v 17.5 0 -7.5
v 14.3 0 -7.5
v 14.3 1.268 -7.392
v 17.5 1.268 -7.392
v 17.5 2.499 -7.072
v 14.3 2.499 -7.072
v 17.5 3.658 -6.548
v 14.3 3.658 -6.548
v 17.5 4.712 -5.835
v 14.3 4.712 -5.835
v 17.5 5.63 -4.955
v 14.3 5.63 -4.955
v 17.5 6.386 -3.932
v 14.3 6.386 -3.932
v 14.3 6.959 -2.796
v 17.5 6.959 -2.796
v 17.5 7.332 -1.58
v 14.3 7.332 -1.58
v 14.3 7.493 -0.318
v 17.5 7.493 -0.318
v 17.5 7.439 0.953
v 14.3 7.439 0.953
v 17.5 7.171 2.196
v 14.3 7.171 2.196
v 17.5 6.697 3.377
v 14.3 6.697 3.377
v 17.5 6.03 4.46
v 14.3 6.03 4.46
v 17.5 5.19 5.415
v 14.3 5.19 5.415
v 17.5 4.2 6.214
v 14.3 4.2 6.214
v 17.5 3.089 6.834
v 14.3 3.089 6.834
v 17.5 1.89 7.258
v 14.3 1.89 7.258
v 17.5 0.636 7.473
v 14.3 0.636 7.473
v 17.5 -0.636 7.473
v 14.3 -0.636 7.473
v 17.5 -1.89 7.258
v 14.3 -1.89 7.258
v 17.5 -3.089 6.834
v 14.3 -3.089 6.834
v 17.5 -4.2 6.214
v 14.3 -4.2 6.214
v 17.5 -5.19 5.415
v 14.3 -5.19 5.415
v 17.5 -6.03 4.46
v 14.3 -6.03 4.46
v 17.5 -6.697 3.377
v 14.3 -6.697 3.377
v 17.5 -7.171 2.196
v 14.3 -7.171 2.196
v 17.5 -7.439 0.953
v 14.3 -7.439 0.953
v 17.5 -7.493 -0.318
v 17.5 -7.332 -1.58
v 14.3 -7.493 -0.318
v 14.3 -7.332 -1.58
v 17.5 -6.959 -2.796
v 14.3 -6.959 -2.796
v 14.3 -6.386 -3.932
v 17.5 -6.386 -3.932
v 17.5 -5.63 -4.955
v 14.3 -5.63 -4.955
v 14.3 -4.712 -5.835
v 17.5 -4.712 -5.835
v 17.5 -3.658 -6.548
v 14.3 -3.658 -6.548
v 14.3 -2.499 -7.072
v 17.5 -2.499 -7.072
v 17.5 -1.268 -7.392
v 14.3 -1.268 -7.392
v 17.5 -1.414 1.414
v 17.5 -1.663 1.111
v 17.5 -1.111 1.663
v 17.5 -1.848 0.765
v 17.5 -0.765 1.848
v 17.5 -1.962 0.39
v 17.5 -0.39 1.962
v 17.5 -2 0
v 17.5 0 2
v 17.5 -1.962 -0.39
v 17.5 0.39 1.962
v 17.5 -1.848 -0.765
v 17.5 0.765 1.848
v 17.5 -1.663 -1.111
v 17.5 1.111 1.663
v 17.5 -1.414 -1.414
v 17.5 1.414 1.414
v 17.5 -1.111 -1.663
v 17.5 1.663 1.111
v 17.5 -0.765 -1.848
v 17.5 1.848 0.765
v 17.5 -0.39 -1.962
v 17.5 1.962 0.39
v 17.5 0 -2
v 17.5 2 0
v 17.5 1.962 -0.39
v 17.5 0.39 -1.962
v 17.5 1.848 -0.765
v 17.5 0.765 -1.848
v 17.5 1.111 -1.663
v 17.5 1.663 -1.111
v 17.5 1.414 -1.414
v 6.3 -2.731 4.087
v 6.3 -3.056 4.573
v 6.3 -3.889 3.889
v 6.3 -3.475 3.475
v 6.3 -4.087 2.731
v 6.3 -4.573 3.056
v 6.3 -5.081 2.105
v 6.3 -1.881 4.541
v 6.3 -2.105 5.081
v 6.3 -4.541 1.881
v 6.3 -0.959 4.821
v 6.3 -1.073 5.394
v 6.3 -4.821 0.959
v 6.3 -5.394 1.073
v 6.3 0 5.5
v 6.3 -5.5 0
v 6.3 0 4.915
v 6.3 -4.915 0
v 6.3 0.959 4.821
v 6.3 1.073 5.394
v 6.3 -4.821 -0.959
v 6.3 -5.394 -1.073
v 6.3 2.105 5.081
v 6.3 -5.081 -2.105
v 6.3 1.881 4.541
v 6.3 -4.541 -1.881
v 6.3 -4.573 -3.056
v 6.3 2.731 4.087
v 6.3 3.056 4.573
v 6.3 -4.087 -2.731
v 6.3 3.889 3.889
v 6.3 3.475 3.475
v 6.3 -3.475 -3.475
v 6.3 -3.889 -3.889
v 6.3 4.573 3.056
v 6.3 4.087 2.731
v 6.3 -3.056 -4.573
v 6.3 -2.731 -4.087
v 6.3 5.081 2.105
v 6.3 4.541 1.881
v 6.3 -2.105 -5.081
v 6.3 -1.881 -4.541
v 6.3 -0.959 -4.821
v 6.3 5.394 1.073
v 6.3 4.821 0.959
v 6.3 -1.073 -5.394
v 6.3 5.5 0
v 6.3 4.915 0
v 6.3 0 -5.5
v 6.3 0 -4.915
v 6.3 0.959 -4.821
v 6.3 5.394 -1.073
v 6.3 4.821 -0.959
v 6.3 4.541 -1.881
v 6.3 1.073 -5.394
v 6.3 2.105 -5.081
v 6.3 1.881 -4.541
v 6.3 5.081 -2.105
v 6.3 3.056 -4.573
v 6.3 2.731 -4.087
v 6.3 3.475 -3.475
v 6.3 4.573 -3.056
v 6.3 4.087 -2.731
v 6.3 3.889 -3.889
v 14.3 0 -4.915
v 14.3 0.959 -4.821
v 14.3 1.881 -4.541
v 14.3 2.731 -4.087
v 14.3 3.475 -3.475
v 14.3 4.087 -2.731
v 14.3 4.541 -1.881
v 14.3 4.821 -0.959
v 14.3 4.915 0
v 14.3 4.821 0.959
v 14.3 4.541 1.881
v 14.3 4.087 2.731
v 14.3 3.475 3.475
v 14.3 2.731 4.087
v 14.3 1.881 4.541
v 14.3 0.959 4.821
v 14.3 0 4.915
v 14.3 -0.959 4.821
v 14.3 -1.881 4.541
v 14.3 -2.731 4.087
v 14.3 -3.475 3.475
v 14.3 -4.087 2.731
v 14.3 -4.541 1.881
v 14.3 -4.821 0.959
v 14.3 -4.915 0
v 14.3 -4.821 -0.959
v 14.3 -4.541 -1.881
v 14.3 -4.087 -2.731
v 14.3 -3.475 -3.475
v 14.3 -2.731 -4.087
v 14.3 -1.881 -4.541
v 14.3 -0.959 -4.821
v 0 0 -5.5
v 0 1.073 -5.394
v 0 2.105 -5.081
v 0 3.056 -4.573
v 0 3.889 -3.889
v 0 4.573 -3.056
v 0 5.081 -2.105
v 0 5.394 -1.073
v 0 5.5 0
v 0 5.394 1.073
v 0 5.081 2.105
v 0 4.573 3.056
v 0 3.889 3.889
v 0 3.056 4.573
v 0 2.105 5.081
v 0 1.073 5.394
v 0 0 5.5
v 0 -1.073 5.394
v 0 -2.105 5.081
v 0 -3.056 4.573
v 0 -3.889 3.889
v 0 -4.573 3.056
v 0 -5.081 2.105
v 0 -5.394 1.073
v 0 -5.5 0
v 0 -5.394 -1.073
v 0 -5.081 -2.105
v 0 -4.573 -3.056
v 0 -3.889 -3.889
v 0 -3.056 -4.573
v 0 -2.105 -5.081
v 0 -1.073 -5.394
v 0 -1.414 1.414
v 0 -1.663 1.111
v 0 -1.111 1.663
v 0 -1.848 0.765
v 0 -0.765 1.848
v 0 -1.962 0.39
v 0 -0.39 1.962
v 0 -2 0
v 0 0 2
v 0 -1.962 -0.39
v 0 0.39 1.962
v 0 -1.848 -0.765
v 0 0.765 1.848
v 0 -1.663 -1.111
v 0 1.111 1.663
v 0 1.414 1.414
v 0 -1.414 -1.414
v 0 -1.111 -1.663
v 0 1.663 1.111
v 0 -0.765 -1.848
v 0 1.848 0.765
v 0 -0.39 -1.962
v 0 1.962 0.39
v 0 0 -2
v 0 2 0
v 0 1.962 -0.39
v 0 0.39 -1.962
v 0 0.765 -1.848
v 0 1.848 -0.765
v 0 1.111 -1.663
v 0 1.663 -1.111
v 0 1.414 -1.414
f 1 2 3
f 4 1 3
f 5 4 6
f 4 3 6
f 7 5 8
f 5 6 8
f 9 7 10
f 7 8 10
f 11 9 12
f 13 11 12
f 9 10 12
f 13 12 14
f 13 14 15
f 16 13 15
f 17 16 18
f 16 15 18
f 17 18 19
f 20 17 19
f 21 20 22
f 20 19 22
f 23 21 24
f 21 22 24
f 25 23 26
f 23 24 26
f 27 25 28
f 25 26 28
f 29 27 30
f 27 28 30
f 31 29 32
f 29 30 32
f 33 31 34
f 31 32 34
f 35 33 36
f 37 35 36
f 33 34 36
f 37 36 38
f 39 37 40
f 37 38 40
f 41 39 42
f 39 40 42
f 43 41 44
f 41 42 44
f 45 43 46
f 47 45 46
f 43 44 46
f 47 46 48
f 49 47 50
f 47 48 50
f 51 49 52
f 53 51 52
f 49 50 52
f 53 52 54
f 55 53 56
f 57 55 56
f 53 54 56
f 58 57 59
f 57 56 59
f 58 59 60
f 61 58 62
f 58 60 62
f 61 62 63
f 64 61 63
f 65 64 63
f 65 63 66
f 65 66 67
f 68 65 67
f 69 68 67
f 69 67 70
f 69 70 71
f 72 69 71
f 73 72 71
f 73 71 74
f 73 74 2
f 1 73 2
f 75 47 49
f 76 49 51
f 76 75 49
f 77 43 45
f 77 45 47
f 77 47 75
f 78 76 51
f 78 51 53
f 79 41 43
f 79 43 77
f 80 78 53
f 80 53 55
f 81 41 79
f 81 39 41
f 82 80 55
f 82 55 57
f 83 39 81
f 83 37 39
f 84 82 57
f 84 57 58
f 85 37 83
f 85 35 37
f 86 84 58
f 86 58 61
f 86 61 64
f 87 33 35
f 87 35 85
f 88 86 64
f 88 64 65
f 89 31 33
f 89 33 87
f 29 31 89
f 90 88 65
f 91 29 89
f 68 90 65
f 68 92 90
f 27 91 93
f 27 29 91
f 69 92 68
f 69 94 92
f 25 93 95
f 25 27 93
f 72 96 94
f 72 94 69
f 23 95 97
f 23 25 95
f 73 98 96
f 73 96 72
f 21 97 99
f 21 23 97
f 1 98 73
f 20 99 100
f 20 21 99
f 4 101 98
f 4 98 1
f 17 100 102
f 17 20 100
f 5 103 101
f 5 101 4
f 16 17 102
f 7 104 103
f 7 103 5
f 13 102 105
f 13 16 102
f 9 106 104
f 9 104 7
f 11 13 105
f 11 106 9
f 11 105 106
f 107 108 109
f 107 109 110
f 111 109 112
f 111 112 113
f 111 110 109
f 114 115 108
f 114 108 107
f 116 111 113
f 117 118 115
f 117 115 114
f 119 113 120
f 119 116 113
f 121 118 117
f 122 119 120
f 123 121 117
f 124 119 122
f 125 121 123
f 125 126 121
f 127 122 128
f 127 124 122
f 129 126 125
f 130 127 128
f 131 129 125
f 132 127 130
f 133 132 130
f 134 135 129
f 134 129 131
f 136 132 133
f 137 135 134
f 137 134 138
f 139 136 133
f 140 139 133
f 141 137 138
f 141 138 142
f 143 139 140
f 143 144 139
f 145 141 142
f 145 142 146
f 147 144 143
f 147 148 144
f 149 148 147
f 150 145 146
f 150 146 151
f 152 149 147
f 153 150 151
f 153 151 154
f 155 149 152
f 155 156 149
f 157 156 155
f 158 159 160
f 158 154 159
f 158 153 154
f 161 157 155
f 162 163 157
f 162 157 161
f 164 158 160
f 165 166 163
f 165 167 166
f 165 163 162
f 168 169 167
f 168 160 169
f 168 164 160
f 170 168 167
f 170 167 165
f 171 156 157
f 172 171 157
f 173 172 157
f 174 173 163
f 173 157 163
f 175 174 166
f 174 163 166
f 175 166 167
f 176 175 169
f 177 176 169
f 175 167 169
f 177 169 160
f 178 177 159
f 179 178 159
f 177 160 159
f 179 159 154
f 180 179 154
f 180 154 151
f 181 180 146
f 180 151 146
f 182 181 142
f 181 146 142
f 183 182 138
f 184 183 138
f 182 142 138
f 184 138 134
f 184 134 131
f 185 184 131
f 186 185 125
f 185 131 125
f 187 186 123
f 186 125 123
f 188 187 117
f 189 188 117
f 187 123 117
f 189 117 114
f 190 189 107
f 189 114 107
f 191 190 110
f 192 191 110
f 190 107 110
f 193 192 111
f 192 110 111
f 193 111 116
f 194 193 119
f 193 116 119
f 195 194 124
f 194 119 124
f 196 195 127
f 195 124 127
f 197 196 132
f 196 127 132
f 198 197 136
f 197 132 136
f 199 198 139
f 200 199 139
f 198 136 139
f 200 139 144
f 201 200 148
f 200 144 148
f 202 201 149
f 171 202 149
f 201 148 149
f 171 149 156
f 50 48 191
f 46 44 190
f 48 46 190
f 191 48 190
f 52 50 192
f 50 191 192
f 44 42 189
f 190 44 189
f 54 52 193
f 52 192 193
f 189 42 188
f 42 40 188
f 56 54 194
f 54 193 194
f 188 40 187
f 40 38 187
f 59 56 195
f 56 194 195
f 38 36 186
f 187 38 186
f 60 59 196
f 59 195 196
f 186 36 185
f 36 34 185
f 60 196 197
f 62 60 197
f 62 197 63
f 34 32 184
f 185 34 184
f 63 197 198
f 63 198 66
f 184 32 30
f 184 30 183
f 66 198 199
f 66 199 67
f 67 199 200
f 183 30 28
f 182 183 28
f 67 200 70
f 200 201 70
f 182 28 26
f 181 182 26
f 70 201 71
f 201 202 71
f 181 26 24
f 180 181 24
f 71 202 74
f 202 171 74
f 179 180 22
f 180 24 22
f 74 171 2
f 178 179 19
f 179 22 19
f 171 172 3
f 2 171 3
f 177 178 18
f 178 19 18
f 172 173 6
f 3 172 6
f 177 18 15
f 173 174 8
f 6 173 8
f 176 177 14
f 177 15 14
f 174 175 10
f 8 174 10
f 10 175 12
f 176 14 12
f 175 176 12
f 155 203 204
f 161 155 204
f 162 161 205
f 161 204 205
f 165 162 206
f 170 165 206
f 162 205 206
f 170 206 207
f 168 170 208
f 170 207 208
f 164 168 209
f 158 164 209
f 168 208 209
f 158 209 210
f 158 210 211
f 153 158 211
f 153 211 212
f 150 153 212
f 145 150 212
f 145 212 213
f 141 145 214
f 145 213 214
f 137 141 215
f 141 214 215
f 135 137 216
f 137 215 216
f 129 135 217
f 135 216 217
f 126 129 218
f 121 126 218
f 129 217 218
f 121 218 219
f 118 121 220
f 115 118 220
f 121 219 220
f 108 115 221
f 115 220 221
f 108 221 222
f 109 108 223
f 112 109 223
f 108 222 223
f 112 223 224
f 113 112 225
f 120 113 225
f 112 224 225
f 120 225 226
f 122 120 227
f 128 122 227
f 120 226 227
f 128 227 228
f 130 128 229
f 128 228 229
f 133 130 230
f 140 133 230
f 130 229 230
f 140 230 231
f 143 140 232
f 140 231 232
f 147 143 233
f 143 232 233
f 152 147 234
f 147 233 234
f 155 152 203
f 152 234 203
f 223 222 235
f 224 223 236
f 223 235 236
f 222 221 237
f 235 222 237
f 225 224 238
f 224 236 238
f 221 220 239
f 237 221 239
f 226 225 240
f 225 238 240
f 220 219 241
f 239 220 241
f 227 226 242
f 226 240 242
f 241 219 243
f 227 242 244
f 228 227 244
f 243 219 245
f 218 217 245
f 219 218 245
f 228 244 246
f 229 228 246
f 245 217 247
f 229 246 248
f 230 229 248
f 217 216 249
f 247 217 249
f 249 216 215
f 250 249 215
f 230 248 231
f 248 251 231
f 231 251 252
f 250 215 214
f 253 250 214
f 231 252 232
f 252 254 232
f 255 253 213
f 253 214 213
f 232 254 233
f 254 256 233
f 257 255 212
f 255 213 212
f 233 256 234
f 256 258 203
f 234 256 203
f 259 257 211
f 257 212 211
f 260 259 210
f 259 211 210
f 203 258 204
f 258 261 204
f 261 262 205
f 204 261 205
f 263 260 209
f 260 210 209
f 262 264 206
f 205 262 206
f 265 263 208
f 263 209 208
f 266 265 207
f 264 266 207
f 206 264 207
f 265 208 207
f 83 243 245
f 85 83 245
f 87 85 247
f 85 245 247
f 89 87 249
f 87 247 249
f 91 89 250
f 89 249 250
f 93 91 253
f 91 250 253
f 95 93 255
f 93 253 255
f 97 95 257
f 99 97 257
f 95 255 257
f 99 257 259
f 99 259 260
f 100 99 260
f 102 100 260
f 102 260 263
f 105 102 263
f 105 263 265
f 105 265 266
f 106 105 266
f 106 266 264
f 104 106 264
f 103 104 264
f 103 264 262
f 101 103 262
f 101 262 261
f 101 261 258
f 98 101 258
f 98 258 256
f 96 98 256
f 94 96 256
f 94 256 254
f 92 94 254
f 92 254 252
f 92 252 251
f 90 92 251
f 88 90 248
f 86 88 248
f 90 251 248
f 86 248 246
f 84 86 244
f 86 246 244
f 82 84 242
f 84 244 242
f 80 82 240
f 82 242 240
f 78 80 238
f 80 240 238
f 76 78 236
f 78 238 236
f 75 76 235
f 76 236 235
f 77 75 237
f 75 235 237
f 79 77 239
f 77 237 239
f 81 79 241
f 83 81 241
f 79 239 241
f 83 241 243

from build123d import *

# Parameters (mm, degrees)
SKETCH1_R           = 5.5
BOSS_EXTRUDE1_DEPTH = 6.3
SKETCH2_R           = 4.915
BOSS_EXTRUDE2_DEPTH = 8
SKETCH3_R           = 7.5
BOSS_EXTRUDE3_DEPTH = 3.2
SKETCH5_R           = 2
CUT_EXTRUDE1_DEPTH  = 21.46338193


with BuildPart() as part:
    # Sketch1 → Boss-Extrude1 (new body)
    with BuildSketch(Plane(origin=(0, 0, 0), x_dir=(0, 0, -1), z_dir=(1, 0, 0))):
        Circle(SKETCH1_R)
    extrude(amount=BOSS_EXTRUDE1_DEPTH)

    # Sketch2 → Boss-Extrude2 (add)
    with BuildSketch(Plane(origin=(6.3, 0, 0), x_dir=(0, 0, -1), z_dir=(1, 0, 0))):
        Circle(SKETCH2_R)
    extrude(amount=BOSS_EXTRUDE2_DEPTH)

    # Sketch3 → Boss-Extrude3 (add)
    with BuildSketch(Plane(origin=(14.3, 0, 0), x_dir=(0, 0, -1), z_dir=(1, 0, 0))):
        Circle(SKETCH3_R)
    extrude(amount=BOSS_EXTRUDE3_DEPTH)

    # Sketch5 → Cut-Extrude1 (cut, through all)
    with BuildSketch(Plane.ZY):
        Circle(SKETCH5_R)
    extrude(amount=-CUT_EXTRUDE1_DEPTH, mode=Mode.SUBTRACT)


solid = part.part
